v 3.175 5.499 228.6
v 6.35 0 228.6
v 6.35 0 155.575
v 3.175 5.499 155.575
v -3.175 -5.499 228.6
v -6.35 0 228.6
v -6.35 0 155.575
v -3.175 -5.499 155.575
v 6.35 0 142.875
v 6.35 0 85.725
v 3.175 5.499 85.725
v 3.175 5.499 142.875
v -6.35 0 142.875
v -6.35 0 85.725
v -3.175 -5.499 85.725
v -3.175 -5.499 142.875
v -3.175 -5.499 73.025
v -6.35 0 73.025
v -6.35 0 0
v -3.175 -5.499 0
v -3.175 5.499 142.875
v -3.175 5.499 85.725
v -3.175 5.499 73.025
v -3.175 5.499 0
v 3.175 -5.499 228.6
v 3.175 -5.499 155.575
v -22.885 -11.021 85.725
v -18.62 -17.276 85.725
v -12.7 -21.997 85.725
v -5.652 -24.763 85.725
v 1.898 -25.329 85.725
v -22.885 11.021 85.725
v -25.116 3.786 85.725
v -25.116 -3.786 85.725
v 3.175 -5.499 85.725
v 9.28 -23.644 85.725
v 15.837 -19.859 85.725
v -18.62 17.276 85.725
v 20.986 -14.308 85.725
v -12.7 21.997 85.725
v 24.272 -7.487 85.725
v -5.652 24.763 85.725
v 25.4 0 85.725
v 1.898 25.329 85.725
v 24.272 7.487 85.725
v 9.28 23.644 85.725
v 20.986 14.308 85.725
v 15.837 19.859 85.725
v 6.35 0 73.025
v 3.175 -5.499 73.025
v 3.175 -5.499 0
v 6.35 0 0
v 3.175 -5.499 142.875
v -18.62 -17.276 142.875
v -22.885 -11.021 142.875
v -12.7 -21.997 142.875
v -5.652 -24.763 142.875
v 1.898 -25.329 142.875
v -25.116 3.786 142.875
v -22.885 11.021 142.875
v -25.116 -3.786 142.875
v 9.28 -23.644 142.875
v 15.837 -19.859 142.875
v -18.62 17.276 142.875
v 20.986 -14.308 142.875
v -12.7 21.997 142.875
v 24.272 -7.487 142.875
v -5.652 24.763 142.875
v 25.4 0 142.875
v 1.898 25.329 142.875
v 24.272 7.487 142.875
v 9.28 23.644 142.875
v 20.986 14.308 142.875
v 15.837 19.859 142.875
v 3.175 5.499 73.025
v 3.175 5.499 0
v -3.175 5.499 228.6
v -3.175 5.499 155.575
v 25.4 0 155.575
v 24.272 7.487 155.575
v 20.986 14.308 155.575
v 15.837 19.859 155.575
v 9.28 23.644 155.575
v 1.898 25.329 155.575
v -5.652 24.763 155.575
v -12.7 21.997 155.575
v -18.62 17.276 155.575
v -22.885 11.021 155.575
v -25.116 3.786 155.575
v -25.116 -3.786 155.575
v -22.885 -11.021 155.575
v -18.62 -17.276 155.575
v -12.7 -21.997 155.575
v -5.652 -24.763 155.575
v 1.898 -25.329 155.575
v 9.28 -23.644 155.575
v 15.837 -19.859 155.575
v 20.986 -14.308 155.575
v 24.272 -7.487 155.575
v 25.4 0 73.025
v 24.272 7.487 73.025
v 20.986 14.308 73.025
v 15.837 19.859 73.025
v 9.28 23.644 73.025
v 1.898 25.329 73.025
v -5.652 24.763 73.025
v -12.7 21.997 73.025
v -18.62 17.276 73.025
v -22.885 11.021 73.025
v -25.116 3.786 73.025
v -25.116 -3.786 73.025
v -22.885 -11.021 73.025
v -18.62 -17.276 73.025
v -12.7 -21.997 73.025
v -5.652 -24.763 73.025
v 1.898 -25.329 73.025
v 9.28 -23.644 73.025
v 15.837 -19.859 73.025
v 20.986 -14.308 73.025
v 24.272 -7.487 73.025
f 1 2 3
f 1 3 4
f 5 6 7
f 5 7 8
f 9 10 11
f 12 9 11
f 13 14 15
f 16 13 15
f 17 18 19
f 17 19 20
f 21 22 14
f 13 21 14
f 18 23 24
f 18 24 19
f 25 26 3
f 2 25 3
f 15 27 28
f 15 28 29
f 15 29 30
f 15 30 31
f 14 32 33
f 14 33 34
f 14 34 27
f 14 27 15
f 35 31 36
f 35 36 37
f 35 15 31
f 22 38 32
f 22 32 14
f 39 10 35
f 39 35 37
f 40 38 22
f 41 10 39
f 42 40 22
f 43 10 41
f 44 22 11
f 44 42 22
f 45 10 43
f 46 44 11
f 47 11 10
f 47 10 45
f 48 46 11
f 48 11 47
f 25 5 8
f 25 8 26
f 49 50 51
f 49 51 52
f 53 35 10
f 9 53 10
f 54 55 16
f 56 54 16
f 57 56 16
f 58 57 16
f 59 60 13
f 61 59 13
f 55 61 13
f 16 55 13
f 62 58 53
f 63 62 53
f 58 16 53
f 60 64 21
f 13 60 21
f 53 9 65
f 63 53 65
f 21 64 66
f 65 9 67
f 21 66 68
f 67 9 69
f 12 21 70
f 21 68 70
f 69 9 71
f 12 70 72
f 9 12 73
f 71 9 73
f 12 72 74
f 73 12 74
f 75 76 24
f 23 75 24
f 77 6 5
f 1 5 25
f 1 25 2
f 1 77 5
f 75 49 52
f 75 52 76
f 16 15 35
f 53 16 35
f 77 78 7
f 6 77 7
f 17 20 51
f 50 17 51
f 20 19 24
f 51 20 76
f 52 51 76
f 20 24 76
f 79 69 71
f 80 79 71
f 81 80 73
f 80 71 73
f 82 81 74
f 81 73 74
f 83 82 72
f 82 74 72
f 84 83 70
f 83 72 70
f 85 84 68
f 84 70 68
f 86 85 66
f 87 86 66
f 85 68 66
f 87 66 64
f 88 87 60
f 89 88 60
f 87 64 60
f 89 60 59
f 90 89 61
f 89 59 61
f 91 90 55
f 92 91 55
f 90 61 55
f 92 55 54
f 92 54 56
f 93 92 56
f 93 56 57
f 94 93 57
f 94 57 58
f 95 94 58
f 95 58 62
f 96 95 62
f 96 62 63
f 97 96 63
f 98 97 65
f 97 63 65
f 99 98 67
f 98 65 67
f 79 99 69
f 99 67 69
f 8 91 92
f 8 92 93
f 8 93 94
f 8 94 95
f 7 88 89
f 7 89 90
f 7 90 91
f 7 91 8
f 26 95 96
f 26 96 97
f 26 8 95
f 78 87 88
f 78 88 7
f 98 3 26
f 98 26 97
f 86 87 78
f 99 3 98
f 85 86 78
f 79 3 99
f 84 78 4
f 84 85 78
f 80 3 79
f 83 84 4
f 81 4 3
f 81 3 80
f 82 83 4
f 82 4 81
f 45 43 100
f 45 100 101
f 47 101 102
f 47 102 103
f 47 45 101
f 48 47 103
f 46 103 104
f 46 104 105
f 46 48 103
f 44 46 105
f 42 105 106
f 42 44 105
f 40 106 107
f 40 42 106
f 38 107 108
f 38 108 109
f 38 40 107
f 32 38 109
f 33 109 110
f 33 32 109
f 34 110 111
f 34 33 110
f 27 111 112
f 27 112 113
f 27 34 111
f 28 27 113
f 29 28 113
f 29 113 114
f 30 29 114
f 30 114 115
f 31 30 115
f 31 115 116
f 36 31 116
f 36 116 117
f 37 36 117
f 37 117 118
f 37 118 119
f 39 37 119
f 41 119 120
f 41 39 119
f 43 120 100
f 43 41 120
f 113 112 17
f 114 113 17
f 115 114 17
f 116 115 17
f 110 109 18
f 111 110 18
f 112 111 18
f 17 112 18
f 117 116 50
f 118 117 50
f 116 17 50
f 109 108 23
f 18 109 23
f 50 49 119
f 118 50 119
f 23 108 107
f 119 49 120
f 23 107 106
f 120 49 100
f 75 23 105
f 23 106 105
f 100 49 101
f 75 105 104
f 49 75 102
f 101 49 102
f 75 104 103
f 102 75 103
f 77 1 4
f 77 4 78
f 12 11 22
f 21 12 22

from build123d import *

# Parameters (mm, degrees)
BOSS_EXTRUDE1_DEPTH = 228.6
SKETCH2_R           = 25.4
BOSS_EXTRUDE2_DEPTH = 12.7
SKETCH3_R           = 25.4
BOSS_EXTRUDE3_DEPTH = 12.7


with BuildPart() as part:
    # Sketch1 → Boss-Extrude1 (new body)
    with BuildSketch(Plane.XY):
        Polygon((-3.175, 5.499261314), (-6.35, 0), (-3.175, -5.499261314), (3.175, -5.499261314), (6.35, 0), (3.175, 5.499261314), align=None)
    extrude(amount=BOSS_EXTRUDE1_DEPTH)

    # Sketch2 → Boss-Extrude2 (add)
    with BuildSketch(Plane.XY.offset(85.725)):
        Circle(SKETCH2_R)
    extrude(amount=-BOSS_EXTRUDE2_DEPTH)

    # Sketch3 → Boss-Extrude3 (add)
    with BuildSketch(Plane.XY.offset(142.875)):
        Circle(SKETCH3_R)
    extrude(amount=BOSS_EXTRUDE3_DEPTH)


solid = part.part
